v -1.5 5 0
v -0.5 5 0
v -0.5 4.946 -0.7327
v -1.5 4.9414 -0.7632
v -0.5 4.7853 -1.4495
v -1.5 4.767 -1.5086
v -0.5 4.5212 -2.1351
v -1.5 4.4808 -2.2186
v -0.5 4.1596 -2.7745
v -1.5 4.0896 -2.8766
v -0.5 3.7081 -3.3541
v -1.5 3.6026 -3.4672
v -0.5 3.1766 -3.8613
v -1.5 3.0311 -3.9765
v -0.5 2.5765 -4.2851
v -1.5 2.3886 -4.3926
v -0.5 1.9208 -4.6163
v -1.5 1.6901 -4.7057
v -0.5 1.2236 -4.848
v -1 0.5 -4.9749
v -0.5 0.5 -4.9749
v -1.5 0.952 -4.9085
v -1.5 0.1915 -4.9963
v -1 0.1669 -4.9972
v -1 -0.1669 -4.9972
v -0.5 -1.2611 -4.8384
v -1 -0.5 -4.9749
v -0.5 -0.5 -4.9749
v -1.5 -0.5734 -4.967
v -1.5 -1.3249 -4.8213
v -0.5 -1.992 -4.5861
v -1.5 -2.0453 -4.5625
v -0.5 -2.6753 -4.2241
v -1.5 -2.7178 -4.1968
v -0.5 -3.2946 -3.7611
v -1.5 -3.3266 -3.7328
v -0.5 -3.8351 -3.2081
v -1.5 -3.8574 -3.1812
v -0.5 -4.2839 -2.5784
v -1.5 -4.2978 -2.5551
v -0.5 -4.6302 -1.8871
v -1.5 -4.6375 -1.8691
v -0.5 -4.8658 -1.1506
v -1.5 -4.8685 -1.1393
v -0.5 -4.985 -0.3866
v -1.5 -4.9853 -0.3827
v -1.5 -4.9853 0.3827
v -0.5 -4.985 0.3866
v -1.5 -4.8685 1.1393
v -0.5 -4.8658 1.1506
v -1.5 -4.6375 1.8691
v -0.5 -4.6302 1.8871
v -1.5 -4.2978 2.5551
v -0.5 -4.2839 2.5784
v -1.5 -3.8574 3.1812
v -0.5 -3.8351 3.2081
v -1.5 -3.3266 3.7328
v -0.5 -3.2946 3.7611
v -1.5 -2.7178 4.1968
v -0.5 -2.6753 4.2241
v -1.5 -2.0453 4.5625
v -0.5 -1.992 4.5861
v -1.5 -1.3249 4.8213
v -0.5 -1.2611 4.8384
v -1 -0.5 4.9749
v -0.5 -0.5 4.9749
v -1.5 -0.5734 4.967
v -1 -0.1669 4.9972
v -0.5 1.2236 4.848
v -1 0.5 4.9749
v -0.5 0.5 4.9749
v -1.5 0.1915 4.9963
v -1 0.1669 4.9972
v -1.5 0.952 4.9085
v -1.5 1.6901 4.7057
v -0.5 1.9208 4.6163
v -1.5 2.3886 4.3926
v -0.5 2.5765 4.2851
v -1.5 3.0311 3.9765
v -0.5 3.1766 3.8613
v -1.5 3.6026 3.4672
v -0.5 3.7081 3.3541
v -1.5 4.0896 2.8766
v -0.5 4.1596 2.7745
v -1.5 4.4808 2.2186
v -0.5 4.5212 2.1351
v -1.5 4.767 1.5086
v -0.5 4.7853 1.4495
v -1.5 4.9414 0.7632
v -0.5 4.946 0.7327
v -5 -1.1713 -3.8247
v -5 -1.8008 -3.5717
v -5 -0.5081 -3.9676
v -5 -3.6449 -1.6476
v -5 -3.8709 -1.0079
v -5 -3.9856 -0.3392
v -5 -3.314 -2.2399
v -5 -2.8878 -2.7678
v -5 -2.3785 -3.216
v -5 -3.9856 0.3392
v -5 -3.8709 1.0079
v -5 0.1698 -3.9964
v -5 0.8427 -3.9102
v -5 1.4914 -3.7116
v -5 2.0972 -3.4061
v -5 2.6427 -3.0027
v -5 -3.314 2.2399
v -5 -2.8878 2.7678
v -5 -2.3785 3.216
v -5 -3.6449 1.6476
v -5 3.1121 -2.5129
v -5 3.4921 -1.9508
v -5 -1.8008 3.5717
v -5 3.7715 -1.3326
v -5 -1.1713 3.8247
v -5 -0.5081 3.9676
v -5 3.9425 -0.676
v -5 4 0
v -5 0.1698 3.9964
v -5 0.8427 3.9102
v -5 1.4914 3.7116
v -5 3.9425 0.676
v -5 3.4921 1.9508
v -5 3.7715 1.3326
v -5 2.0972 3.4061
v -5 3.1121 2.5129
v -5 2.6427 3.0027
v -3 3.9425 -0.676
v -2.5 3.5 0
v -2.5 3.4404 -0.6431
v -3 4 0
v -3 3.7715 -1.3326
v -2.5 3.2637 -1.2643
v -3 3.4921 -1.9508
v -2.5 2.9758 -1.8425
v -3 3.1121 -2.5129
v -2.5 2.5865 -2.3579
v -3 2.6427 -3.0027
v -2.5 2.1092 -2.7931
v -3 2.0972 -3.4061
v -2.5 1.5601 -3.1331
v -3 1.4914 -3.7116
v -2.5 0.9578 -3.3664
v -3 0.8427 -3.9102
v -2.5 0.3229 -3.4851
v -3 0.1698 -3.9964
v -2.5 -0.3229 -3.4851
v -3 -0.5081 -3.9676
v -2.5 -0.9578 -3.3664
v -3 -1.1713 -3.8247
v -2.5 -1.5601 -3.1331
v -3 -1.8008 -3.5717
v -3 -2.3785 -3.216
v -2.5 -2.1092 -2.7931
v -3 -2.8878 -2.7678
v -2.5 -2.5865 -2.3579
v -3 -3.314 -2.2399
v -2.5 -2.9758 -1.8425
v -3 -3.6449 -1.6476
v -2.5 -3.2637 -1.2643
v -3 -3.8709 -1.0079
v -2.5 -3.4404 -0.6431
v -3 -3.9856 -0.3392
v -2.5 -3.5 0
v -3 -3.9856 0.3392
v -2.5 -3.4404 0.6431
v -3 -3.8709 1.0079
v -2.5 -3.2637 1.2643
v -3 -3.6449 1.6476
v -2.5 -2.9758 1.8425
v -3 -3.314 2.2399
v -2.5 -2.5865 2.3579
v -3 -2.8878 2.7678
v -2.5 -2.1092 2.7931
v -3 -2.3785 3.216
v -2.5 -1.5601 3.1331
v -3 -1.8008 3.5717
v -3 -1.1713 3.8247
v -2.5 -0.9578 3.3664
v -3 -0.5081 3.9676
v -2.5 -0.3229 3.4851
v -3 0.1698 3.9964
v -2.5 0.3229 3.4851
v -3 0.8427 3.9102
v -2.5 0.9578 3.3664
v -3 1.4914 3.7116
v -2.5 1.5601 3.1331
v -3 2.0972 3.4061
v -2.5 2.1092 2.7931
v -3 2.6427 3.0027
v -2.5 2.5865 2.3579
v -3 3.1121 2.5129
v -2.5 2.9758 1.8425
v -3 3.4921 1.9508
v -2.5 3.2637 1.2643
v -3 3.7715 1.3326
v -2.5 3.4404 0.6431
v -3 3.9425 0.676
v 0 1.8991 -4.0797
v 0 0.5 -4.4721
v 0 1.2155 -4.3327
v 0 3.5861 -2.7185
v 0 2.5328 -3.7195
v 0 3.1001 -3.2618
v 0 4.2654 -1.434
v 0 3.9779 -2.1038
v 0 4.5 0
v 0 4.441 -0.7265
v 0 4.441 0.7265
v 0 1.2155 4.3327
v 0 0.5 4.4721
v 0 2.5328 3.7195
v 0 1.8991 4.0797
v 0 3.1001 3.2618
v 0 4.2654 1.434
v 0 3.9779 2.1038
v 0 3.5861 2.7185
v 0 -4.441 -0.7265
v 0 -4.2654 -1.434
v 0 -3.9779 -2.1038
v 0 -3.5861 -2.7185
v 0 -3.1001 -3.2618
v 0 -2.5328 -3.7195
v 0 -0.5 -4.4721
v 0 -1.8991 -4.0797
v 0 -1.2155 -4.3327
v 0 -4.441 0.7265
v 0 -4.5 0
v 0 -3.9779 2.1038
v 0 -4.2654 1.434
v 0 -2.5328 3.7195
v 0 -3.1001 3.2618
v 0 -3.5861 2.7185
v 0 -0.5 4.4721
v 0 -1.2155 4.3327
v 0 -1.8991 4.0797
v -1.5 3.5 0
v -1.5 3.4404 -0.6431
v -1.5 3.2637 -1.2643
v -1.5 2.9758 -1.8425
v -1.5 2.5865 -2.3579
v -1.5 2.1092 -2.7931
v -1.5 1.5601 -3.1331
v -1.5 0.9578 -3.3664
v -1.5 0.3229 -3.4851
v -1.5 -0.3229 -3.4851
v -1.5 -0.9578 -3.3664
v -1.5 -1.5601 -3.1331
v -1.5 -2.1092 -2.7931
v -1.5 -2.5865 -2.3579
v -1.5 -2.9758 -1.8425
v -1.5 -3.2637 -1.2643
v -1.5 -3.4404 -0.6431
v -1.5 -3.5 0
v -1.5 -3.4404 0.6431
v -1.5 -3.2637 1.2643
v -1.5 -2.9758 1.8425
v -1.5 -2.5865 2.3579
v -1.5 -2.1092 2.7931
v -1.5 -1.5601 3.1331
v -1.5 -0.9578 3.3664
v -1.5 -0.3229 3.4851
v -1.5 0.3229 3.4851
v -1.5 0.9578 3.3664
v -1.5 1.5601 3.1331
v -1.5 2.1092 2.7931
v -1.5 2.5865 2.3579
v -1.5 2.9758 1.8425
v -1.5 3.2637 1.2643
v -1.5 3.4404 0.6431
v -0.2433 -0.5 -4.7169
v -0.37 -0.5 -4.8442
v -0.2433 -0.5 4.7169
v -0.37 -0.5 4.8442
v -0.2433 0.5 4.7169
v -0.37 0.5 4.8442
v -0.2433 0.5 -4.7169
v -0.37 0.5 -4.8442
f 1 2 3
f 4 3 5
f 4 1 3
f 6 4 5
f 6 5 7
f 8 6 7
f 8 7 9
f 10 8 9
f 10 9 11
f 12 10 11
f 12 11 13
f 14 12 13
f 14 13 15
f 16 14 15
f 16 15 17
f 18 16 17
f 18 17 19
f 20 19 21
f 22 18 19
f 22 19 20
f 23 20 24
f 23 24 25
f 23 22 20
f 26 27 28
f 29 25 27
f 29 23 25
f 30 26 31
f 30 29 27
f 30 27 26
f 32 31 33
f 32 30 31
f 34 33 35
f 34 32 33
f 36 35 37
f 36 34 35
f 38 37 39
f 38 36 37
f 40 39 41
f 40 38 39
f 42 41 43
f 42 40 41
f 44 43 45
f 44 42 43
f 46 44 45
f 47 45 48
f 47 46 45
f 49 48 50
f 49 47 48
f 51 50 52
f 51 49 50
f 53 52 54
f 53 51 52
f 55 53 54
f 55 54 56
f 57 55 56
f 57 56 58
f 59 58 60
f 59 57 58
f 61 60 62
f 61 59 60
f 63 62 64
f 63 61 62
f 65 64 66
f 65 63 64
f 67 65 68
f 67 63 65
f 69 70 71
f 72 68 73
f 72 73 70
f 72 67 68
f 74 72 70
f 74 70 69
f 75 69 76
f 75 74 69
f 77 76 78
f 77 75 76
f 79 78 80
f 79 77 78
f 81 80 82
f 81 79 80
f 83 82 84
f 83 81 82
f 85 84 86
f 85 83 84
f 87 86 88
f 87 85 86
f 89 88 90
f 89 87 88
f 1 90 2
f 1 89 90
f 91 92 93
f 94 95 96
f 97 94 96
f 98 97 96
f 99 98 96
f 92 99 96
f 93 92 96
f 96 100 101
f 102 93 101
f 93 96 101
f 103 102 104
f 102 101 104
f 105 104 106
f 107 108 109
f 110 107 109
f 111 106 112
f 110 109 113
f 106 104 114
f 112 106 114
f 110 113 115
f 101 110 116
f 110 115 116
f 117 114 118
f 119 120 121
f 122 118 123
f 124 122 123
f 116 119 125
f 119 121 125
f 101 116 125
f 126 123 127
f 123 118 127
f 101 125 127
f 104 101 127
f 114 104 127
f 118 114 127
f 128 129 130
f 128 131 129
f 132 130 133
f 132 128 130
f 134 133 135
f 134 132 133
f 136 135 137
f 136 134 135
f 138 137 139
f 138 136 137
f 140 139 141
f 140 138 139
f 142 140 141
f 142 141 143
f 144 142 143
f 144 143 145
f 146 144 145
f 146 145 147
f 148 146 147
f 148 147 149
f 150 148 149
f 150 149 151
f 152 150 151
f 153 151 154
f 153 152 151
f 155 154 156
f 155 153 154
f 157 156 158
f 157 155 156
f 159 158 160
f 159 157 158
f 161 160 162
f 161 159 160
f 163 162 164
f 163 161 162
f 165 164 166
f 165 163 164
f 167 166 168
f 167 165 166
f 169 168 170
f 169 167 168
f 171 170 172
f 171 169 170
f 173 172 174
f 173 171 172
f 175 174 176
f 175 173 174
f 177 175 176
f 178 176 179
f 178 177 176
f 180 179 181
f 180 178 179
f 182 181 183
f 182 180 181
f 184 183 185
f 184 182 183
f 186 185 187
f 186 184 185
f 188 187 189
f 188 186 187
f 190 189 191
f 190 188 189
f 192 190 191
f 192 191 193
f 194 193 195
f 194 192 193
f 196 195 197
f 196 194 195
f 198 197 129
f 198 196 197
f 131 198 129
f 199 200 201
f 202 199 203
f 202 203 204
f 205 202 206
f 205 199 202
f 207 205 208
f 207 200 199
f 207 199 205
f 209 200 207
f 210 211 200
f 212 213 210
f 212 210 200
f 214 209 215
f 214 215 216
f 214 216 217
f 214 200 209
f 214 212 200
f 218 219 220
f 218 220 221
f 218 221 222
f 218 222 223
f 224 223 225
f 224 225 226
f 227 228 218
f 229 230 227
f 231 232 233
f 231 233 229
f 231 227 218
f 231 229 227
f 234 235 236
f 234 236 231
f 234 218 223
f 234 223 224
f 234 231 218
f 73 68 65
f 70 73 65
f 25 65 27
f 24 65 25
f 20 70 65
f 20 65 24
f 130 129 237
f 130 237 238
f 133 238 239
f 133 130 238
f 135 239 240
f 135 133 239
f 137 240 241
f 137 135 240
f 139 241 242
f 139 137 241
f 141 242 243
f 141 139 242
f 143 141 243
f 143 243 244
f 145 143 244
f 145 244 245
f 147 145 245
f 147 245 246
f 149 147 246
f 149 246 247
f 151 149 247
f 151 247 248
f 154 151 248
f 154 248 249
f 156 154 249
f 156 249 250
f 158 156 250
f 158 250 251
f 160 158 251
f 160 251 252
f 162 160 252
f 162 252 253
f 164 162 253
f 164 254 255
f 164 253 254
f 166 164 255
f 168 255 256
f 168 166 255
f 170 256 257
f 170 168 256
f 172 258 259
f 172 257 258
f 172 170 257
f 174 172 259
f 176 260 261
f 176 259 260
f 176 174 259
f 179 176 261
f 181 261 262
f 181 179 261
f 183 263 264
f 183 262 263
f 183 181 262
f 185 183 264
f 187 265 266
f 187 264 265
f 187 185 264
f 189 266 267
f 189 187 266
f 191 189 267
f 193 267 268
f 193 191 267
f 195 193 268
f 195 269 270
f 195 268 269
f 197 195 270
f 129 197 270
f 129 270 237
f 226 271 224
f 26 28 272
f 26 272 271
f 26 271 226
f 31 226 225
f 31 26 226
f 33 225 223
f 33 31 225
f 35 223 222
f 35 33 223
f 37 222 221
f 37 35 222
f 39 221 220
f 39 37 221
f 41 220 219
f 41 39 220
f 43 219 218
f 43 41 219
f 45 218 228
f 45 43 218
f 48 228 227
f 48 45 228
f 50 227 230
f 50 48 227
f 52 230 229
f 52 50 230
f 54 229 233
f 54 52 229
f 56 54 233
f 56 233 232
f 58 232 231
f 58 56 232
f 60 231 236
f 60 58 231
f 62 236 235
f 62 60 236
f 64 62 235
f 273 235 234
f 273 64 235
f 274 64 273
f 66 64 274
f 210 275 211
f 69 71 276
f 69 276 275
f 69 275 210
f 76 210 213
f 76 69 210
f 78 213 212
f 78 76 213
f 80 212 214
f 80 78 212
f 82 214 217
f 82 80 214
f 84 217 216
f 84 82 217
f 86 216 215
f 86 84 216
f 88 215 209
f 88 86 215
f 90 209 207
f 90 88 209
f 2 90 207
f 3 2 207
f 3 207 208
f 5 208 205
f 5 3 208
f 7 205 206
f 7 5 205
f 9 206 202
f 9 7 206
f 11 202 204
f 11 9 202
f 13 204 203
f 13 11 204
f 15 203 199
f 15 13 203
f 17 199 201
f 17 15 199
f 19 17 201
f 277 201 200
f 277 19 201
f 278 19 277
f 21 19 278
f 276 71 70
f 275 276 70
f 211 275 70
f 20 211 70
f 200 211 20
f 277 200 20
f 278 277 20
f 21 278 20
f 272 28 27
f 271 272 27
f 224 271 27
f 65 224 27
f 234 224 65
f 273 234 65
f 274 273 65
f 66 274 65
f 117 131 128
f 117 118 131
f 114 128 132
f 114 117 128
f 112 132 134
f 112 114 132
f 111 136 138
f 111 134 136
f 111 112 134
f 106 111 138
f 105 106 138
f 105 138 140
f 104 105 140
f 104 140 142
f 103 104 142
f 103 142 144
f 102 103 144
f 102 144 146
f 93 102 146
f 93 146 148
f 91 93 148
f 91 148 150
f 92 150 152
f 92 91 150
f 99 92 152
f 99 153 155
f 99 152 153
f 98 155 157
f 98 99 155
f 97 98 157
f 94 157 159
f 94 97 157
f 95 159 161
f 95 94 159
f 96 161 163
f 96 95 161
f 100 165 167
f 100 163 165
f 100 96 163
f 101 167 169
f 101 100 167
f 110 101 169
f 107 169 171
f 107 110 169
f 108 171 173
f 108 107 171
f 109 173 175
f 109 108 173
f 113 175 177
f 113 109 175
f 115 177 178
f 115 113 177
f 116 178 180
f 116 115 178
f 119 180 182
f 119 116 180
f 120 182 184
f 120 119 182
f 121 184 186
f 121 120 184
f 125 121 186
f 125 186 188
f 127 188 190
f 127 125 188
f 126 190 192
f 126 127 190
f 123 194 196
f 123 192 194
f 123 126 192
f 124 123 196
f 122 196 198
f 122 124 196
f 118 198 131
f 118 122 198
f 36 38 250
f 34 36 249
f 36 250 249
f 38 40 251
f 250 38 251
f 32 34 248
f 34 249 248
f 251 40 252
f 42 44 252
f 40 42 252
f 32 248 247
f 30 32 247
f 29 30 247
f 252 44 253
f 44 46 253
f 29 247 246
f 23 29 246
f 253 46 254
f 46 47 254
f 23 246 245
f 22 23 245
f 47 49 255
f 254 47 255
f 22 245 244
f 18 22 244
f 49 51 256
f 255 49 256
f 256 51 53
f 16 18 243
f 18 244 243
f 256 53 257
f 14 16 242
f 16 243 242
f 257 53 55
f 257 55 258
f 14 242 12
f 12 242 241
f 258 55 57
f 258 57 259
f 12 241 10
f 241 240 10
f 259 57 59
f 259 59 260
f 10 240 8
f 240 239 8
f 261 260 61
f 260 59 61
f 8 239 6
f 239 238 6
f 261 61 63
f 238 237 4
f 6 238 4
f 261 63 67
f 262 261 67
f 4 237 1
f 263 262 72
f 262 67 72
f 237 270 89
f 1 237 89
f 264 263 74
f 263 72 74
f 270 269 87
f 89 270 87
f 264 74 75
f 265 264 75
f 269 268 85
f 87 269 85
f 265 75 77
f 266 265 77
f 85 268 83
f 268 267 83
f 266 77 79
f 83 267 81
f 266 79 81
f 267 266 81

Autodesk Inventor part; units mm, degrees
ref_plane "YZ Plane" through (0, 0, 0) normal (1, 0, 0) x (0, 1, 0)
ref_plane "XZ Plane" through (0, 0, 0) normal (0, 1, 0) x (-1, 0, 0)
ref_plane "XY Plane" through (0, 0, 0) normal (0, 0, 1) x (1, 0, 0)
sketch "Skizze1" plane through (0, 0, 0) normal (0, 0, 1) x (1, 0, 0)
  line L0 (-6, 0) -> (1, 0) projected
  line L1 (0, -1) -> (0, 6) projected
  line L2 (0, 0) -> (0, 5)
  line L3 (0, 5) -> (-1.5, 5)
  line L4 (-1.5, 5) -> (-1.5, 3.5)
  line L5 (-1.5, 3.5) -> (-2.5, 3.5)
  line L6 (-2.5, 3.5) -> (-3, 4)
  line L7 (-3, 4) -> (-5, 4)
  line L8 (-5, 4) -> (-5, 0)
  line L9 (-5, 0) -> (0, 0)
  dimension "d0" = 8
  dimension "d1" = 10
  dimension "d2" = 1.5
  dimension "d3" = 1
  dimension "d4" = 7
  dimension "d5" = 45
  dimension "d6" = 5
revolve "Umdrehung1" add sketch "Skizze1" angle 360 about axis through (-10, 0, 0) along (1, 0, 0)
sketch "Skizze2" plane through (0, 0, 0) normal (1, 0, 0) x (0, 0, -1)
  line L0 (-7.1847, 0.5) -> (7.4374, 0.5)
  line L1 (7.4374, 0.5) -> (7.4374, -0.5)
  line L2 (7.4374, -0.5) -> (-7.1847, -0.5)
  line L3 (-7.1847, -0.5) -> (-7.1847, 0.5)
  line L4 (0, -7) -> (0, 7) projected
  line L5 (10.3619, 0) -> (-10.1091, 0) projected
  dimension "d8" = 1
extrude "Extrusion1" cut sketch "Skizze2" against normal blind 1
thread "Gewinde1" size "M8x0.5" class "6g" standard "ANSI Metric M Profile" full length
chamfer "Fase1" distance 0.5 angle 45 3 edges at (0, -5, 0) (0, 3.7081, -3.3541) (0, 3.7081, 3.3541)
properties part number "13_1087_042"
